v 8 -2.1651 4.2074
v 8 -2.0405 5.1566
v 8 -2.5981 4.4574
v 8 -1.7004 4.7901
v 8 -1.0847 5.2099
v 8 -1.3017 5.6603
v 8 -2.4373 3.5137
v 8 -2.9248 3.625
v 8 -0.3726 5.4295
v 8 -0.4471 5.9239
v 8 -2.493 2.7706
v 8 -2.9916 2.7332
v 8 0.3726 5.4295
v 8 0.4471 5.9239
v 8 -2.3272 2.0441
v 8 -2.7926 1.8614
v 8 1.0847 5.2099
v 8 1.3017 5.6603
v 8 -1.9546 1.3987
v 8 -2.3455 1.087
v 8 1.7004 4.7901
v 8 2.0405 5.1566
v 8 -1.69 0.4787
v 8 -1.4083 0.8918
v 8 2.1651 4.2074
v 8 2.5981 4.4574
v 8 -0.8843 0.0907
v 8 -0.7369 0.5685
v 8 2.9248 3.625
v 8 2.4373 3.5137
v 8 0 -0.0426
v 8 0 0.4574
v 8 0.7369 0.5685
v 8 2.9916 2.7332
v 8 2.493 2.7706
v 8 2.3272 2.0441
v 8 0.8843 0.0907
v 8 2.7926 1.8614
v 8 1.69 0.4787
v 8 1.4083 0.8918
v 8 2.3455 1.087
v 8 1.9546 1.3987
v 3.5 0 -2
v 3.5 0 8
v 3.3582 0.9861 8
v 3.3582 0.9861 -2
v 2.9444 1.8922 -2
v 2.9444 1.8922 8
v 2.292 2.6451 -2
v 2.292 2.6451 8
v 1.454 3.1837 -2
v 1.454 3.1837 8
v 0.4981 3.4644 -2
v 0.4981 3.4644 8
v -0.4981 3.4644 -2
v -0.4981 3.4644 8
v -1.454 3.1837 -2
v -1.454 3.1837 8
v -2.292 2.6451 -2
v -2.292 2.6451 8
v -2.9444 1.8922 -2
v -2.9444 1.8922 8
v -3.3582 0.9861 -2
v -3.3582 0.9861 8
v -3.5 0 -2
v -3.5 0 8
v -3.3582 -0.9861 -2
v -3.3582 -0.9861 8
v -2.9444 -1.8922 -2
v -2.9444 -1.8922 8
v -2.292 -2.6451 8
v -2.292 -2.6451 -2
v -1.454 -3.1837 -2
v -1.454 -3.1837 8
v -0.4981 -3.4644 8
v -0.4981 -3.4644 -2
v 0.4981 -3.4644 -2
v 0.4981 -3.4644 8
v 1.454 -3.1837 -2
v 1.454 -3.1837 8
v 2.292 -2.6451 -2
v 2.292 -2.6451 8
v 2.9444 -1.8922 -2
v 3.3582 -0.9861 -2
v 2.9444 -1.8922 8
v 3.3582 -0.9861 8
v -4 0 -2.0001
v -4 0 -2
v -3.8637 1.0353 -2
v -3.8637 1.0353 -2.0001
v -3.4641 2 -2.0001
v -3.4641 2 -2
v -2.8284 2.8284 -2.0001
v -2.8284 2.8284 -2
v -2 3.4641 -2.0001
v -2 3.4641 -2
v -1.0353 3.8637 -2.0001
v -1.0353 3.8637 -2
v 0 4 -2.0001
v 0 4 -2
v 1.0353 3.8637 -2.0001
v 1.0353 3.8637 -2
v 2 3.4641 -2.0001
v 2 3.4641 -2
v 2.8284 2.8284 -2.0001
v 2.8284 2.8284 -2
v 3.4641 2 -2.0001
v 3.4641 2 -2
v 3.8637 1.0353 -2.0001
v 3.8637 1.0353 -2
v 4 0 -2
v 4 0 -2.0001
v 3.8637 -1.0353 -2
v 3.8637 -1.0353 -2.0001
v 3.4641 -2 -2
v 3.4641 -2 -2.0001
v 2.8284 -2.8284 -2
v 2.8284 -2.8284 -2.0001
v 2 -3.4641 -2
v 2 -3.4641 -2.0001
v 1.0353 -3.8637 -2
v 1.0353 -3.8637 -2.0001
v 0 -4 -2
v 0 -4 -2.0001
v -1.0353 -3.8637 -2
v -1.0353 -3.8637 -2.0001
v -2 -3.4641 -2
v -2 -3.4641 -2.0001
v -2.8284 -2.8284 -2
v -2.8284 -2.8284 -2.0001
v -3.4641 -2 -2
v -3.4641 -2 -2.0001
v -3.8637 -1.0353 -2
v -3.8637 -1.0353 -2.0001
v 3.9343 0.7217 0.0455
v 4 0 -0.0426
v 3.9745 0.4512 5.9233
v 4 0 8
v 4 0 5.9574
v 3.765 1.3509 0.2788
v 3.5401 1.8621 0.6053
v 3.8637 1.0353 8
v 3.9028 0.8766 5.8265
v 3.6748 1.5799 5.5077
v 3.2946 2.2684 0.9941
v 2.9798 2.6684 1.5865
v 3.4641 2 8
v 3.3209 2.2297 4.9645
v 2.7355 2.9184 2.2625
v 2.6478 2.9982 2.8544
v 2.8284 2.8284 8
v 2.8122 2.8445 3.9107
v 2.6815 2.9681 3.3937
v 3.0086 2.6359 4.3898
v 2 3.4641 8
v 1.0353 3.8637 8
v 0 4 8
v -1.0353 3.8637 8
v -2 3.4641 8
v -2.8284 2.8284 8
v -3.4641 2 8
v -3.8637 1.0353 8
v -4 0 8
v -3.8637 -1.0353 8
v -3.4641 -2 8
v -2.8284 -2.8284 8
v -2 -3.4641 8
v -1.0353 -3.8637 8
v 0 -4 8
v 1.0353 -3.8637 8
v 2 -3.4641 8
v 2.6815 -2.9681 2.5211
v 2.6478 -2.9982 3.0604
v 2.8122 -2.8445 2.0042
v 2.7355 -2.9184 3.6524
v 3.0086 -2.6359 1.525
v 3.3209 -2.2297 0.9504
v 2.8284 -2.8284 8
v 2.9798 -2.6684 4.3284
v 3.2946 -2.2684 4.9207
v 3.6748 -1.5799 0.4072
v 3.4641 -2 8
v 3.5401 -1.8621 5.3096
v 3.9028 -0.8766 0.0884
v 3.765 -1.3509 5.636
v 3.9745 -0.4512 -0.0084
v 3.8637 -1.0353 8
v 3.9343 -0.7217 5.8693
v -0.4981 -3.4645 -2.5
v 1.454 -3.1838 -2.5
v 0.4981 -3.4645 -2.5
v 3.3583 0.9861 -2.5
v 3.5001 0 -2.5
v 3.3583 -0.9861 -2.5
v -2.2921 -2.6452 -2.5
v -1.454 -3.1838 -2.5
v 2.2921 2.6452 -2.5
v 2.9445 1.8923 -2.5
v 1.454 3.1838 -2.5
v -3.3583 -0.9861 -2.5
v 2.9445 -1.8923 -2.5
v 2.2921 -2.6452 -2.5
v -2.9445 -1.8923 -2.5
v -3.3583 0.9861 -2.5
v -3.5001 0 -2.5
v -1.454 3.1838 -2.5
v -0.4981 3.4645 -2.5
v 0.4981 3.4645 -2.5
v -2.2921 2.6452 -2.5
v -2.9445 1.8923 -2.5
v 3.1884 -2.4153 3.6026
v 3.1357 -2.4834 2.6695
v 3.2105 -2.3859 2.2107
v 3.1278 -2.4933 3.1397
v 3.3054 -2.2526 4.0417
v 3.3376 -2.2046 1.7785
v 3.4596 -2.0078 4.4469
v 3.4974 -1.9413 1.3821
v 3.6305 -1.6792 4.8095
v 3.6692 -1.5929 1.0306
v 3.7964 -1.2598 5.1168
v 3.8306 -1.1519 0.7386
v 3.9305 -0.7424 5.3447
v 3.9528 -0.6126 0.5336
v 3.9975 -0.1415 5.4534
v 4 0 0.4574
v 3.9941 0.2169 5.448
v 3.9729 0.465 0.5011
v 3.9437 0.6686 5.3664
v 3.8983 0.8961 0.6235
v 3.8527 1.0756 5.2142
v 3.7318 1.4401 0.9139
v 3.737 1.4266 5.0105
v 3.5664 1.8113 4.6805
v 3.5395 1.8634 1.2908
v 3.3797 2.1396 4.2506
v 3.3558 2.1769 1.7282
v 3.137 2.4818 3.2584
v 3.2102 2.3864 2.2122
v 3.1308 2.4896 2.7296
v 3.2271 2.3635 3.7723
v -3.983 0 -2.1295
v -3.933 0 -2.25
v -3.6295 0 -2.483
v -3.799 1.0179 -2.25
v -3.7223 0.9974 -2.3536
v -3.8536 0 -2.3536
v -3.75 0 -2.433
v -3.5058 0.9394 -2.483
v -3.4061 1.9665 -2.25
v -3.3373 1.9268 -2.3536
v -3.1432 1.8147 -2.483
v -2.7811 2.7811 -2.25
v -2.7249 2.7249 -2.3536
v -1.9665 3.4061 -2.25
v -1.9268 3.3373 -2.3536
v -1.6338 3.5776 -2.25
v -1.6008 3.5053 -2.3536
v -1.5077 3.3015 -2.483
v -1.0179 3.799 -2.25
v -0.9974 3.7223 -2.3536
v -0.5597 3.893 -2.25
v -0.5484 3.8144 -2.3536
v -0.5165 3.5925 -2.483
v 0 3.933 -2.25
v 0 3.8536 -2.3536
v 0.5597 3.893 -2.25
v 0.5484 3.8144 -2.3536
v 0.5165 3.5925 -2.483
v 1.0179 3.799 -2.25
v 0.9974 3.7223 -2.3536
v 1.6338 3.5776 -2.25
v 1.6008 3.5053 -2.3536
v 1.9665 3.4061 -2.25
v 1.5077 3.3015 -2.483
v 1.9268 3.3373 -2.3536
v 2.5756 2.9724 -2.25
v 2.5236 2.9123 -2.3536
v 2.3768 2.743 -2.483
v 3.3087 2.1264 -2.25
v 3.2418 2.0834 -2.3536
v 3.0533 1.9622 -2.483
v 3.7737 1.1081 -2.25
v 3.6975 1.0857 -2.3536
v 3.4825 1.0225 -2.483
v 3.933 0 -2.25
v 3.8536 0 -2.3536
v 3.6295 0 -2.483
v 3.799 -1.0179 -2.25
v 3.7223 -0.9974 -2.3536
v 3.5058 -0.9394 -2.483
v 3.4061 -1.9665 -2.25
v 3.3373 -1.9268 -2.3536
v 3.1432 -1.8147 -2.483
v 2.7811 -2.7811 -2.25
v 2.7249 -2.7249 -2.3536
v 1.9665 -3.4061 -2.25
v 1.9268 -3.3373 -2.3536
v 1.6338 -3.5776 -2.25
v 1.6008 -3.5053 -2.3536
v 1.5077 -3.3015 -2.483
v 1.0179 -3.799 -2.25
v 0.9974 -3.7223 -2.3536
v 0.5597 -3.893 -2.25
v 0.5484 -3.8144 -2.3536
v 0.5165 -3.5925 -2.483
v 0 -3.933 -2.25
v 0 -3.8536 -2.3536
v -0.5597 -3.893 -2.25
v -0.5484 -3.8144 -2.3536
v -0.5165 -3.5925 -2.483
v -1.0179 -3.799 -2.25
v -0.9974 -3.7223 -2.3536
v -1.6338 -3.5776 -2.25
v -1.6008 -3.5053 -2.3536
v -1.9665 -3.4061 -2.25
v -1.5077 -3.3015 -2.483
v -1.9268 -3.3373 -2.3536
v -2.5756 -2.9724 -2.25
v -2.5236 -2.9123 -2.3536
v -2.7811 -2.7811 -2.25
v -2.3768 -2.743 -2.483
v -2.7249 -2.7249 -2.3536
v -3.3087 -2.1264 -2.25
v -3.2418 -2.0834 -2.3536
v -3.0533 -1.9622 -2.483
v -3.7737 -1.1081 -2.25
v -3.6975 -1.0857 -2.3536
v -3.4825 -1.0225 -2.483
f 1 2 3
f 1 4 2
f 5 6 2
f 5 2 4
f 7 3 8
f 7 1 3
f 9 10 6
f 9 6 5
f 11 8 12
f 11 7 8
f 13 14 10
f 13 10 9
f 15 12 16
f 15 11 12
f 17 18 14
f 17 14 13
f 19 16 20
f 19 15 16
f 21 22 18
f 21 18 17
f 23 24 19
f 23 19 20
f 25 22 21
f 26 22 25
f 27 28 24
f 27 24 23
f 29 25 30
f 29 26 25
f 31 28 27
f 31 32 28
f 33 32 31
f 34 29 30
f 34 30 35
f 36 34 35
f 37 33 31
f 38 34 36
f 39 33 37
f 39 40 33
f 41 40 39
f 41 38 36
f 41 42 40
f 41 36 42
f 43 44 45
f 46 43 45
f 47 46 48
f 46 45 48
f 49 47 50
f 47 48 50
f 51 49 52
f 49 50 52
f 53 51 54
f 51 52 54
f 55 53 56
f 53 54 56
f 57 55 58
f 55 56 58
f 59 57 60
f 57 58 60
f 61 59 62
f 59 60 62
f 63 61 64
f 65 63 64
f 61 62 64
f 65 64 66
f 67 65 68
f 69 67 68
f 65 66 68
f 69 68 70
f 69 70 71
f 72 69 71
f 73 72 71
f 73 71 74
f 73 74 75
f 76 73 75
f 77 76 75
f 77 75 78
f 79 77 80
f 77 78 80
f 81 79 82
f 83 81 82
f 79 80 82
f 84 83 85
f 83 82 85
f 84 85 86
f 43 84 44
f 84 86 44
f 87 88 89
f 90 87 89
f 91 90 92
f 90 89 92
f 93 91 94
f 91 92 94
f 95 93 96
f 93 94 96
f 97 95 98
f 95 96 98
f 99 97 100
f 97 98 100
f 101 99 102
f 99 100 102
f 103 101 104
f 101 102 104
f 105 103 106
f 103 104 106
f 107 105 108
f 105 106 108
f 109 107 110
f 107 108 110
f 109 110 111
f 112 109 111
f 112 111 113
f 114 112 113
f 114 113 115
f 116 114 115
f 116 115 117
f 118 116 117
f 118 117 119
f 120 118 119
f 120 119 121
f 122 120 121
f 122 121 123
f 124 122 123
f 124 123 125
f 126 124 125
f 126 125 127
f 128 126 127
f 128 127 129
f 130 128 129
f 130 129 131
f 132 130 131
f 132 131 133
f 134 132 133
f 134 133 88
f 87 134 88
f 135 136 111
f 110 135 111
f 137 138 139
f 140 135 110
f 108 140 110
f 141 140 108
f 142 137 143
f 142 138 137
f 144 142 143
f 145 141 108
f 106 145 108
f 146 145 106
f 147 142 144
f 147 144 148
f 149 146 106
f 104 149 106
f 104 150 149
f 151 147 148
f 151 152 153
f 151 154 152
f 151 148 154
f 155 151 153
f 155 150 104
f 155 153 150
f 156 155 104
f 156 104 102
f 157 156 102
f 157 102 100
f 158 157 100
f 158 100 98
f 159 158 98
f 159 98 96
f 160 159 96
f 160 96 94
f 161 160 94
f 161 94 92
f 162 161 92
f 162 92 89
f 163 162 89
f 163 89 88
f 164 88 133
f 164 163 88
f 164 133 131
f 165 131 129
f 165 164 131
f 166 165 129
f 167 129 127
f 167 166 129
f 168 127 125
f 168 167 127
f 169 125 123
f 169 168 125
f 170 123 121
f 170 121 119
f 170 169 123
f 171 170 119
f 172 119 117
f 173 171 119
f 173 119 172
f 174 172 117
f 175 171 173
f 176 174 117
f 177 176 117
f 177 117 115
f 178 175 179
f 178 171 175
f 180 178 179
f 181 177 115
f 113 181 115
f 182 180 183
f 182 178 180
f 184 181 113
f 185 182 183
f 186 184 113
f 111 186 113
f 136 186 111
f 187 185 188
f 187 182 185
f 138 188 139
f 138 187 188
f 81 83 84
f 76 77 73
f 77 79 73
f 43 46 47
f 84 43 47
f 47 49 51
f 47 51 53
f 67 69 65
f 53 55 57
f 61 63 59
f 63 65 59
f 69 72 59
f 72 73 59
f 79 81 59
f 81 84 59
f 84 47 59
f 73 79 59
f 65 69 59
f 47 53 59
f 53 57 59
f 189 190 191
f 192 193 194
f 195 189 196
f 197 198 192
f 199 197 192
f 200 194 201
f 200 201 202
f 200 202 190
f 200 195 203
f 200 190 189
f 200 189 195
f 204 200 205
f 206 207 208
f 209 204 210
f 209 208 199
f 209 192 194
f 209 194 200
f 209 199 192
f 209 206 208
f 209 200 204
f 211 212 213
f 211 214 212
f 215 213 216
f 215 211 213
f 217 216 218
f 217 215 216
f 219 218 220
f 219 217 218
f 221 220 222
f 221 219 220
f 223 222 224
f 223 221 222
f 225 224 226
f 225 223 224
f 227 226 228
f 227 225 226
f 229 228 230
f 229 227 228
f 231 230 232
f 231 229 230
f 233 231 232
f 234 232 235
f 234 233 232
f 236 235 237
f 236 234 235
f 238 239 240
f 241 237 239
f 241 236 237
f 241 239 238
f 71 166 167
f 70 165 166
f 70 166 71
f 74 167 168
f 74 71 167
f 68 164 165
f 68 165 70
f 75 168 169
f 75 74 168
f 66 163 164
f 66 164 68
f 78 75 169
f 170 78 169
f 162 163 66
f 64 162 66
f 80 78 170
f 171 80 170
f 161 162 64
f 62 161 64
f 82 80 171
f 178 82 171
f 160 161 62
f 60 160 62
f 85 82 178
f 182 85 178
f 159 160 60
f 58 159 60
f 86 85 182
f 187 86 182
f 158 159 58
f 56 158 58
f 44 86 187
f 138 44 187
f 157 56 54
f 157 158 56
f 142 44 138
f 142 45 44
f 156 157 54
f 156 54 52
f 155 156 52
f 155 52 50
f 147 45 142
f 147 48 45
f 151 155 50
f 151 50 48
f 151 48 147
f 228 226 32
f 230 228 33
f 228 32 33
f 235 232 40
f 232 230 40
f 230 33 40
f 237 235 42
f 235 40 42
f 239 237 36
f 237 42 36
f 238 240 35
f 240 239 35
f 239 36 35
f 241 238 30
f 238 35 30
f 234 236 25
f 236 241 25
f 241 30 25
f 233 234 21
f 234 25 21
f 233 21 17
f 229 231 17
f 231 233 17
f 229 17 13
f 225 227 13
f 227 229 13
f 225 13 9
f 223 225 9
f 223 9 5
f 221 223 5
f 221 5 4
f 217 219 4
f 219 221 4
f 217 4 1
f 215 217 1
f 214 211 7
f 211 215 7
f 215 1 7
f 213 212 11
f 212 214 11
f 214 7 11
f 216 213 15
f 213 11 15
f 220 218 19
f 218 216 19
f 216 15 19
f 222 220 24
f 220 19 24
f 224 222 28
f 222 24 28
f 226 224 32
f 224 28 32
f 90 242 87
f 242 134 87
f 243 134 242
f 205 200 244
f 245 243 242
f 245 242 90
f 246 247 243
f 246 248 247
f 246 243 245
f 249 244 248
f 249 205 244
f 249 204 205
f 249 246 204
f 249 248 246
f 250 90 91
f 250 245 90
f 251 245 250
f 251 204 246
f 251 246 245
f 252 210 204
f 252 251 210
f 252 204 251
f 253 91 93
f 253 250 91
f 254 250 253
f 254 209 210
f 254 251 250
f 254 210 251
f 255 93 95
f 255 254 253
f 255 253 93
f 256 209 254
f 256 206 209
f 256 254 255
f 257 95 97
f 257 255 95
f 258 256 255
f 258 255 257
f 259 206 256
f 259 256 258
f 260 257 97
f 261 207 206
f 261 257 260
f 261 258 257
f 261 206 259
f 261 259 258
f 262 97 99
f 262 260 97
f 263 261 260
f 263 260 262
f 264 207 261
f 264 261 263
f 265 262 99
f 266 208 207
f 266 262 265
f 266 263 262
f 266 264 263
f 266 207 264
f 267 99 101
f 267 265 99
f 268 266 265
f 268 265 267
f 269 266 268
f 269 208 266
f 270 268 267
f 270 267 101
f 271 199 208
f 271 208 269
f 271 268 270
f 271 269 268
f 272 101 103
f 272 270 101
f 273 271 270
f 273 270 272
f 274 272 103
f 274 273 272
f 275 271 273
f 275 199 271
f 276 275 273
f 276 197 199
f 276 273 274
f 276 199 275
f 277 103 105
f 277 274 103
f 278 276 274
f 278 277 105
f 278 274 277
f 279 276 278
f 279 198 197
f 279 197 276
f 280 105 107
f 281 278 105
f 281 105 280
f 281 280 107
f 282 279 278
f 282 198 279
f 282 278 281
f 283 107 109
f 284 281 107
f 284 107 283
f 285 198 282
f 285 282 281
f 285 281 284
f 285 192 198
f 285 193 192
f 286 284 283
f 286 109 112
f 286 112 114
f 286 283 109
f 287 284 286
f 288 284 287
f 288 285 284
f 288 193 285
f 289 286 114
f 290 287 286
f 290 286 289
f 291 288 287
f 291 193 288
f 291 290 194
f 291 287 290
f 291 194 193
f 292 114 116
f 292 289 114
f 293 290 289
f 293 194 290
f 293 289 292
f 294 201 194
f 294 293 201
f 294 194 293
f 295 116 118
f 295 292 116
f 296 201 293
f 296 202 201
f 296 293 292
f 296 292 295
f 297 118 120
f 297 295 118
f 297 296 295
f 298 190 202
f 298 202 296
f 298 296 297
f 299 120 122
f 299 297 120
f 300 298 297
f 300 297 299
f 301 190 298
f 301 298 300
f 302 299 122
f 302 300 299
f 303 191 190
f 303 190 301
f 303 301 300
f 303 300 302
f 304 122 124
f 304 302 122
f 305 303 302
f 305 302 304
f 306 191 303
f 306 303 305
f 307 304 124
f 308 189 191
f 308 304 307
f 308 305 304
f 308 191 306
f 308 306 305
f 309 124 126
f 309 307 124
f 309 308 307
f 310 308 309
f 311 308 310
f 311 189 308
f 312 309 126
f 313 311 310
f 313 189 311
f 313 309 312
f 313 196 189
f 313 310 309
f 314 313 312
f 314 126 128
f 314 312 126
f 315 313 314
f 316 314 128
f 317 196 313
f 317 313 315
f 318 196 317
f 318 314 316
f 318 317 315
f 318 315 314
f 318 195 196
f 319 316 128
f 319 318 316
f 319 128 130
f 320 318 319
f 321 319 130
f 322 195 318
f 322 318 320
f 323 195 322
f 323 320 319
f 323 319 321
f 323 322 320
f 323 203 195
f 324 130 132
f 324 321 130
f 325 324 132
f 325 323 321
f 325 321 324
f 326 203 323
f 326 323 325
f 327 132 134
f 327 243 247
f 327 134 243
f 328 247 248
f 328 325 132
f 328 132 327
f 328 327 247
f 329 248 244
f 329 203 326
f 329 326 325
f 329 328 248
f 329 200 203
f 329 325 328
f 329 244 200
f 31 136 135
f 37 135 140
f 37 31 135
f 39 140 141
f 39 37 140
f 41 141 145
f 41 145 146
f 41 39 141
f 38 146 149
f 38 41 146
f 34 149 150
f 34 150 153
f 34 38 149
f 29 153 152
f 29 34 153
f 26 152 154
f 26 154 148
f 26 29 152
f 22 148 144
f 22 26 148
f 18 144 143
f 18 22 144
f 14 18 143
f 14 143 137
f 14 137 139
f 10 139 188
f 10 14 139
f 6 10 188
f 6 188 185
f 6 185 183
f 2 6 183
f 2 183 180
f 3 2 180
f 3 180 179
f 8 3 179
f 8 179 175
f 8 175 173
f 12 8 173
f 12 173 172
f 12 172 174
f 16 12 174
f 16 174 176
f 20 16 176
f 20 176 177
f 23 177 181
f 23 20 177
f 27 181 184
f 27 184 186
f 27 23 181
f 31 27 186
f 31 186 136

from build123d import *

# Parameters (mm, degrees)
SKETCH2_R                = 4
SKETCH2_R_2              = 3.5
BOSS_EXTRUDE1_DEPTH      = 10
BOSS_EXTRUDE2_REACH      = 15.601
BOSS_EXTRUDE2_END_RADIUS = 4
SKETCH3_R                = 3
SKETCH3_R_2              = 2.5
SKETCH4_R                = 4
BOSS_EXTRUDE3_DEPTH      = 0.5
FILLET2_R                = 0.5


with BuildPart() as part:
    # Sketch2 → Boss-Extrude1 (new body)
    with BuildSketch(Plane.XY.offset(8)):
        Circle(SKETCH2_R)
        Circle(SKETCH2_R_2, mode=Mode.SUBTRACT)
    extrude(amount=BOSS_EXTRUDE1_DEPTH)


with BuildPart() as body_2:
    # Mirror2: mirrored copy
    add(part.part.mirror(Plane.XY.offset(8)))

    # Boss-Extrude2: up to this cylinder (the profile starts outside it)
    boss_extrude2_end = Plane(origin=(0, 0, 5.872578), z_dir=(0, 0, 1)) * Cylinder(BOSS_EXTRUDE2_END_RADIUS, 40.202, mode=Mode.PRIVATE)
    # Sketch3 → Boss-Extrude2 (add, up to the surface)
    with BuildSketch(Plane(origin=(8, 0, 3), x_dir=(0, 0, -1), z_dir=(1, 0, 0)), mode=Mode.PRIVATE) as boss_extrude2_sk1:
        with Locations((0.042568871, 0)):
            Circle(SKETCH3_R)
        with Locations((0.042568871, 0)):
            Circle(SKETCH3_R_2, mode=Mode.SUBTRACT)
    boss_extrude2_tool1 = extrude(boss_extrude2_sk1.sketch, amount=-BOSS_EXTRUDE2_REACH, mode=Mode.PRIVATE) - boss_extrude2_end
    add(boss_extrude2_tool1.solids().sort_by_distance((8, 0, 5.872578))[0])

    # Sketch4 → Boss-Extrude3 (add)
    with BuildSketch(Plane(origin=(0, 0, -2), x_dir=(-1, 0, 0), z_dir=(0, 0, -1))):
        Circle(SKETCH4_R)
    extrude(amount=BOSS_EXTRUDE3_DEPTH)

    # Fillet2
    fillet2_edges = [body_2.edges().sort_by_distance(p)[0] for p in [
        (4, 0, -2.5),
    ]]
    fillet(fillet2_edges, radius=FILLET2_R - 0.0001)  # a hair under: the kernel refuses the full size


solid = body_2.part
